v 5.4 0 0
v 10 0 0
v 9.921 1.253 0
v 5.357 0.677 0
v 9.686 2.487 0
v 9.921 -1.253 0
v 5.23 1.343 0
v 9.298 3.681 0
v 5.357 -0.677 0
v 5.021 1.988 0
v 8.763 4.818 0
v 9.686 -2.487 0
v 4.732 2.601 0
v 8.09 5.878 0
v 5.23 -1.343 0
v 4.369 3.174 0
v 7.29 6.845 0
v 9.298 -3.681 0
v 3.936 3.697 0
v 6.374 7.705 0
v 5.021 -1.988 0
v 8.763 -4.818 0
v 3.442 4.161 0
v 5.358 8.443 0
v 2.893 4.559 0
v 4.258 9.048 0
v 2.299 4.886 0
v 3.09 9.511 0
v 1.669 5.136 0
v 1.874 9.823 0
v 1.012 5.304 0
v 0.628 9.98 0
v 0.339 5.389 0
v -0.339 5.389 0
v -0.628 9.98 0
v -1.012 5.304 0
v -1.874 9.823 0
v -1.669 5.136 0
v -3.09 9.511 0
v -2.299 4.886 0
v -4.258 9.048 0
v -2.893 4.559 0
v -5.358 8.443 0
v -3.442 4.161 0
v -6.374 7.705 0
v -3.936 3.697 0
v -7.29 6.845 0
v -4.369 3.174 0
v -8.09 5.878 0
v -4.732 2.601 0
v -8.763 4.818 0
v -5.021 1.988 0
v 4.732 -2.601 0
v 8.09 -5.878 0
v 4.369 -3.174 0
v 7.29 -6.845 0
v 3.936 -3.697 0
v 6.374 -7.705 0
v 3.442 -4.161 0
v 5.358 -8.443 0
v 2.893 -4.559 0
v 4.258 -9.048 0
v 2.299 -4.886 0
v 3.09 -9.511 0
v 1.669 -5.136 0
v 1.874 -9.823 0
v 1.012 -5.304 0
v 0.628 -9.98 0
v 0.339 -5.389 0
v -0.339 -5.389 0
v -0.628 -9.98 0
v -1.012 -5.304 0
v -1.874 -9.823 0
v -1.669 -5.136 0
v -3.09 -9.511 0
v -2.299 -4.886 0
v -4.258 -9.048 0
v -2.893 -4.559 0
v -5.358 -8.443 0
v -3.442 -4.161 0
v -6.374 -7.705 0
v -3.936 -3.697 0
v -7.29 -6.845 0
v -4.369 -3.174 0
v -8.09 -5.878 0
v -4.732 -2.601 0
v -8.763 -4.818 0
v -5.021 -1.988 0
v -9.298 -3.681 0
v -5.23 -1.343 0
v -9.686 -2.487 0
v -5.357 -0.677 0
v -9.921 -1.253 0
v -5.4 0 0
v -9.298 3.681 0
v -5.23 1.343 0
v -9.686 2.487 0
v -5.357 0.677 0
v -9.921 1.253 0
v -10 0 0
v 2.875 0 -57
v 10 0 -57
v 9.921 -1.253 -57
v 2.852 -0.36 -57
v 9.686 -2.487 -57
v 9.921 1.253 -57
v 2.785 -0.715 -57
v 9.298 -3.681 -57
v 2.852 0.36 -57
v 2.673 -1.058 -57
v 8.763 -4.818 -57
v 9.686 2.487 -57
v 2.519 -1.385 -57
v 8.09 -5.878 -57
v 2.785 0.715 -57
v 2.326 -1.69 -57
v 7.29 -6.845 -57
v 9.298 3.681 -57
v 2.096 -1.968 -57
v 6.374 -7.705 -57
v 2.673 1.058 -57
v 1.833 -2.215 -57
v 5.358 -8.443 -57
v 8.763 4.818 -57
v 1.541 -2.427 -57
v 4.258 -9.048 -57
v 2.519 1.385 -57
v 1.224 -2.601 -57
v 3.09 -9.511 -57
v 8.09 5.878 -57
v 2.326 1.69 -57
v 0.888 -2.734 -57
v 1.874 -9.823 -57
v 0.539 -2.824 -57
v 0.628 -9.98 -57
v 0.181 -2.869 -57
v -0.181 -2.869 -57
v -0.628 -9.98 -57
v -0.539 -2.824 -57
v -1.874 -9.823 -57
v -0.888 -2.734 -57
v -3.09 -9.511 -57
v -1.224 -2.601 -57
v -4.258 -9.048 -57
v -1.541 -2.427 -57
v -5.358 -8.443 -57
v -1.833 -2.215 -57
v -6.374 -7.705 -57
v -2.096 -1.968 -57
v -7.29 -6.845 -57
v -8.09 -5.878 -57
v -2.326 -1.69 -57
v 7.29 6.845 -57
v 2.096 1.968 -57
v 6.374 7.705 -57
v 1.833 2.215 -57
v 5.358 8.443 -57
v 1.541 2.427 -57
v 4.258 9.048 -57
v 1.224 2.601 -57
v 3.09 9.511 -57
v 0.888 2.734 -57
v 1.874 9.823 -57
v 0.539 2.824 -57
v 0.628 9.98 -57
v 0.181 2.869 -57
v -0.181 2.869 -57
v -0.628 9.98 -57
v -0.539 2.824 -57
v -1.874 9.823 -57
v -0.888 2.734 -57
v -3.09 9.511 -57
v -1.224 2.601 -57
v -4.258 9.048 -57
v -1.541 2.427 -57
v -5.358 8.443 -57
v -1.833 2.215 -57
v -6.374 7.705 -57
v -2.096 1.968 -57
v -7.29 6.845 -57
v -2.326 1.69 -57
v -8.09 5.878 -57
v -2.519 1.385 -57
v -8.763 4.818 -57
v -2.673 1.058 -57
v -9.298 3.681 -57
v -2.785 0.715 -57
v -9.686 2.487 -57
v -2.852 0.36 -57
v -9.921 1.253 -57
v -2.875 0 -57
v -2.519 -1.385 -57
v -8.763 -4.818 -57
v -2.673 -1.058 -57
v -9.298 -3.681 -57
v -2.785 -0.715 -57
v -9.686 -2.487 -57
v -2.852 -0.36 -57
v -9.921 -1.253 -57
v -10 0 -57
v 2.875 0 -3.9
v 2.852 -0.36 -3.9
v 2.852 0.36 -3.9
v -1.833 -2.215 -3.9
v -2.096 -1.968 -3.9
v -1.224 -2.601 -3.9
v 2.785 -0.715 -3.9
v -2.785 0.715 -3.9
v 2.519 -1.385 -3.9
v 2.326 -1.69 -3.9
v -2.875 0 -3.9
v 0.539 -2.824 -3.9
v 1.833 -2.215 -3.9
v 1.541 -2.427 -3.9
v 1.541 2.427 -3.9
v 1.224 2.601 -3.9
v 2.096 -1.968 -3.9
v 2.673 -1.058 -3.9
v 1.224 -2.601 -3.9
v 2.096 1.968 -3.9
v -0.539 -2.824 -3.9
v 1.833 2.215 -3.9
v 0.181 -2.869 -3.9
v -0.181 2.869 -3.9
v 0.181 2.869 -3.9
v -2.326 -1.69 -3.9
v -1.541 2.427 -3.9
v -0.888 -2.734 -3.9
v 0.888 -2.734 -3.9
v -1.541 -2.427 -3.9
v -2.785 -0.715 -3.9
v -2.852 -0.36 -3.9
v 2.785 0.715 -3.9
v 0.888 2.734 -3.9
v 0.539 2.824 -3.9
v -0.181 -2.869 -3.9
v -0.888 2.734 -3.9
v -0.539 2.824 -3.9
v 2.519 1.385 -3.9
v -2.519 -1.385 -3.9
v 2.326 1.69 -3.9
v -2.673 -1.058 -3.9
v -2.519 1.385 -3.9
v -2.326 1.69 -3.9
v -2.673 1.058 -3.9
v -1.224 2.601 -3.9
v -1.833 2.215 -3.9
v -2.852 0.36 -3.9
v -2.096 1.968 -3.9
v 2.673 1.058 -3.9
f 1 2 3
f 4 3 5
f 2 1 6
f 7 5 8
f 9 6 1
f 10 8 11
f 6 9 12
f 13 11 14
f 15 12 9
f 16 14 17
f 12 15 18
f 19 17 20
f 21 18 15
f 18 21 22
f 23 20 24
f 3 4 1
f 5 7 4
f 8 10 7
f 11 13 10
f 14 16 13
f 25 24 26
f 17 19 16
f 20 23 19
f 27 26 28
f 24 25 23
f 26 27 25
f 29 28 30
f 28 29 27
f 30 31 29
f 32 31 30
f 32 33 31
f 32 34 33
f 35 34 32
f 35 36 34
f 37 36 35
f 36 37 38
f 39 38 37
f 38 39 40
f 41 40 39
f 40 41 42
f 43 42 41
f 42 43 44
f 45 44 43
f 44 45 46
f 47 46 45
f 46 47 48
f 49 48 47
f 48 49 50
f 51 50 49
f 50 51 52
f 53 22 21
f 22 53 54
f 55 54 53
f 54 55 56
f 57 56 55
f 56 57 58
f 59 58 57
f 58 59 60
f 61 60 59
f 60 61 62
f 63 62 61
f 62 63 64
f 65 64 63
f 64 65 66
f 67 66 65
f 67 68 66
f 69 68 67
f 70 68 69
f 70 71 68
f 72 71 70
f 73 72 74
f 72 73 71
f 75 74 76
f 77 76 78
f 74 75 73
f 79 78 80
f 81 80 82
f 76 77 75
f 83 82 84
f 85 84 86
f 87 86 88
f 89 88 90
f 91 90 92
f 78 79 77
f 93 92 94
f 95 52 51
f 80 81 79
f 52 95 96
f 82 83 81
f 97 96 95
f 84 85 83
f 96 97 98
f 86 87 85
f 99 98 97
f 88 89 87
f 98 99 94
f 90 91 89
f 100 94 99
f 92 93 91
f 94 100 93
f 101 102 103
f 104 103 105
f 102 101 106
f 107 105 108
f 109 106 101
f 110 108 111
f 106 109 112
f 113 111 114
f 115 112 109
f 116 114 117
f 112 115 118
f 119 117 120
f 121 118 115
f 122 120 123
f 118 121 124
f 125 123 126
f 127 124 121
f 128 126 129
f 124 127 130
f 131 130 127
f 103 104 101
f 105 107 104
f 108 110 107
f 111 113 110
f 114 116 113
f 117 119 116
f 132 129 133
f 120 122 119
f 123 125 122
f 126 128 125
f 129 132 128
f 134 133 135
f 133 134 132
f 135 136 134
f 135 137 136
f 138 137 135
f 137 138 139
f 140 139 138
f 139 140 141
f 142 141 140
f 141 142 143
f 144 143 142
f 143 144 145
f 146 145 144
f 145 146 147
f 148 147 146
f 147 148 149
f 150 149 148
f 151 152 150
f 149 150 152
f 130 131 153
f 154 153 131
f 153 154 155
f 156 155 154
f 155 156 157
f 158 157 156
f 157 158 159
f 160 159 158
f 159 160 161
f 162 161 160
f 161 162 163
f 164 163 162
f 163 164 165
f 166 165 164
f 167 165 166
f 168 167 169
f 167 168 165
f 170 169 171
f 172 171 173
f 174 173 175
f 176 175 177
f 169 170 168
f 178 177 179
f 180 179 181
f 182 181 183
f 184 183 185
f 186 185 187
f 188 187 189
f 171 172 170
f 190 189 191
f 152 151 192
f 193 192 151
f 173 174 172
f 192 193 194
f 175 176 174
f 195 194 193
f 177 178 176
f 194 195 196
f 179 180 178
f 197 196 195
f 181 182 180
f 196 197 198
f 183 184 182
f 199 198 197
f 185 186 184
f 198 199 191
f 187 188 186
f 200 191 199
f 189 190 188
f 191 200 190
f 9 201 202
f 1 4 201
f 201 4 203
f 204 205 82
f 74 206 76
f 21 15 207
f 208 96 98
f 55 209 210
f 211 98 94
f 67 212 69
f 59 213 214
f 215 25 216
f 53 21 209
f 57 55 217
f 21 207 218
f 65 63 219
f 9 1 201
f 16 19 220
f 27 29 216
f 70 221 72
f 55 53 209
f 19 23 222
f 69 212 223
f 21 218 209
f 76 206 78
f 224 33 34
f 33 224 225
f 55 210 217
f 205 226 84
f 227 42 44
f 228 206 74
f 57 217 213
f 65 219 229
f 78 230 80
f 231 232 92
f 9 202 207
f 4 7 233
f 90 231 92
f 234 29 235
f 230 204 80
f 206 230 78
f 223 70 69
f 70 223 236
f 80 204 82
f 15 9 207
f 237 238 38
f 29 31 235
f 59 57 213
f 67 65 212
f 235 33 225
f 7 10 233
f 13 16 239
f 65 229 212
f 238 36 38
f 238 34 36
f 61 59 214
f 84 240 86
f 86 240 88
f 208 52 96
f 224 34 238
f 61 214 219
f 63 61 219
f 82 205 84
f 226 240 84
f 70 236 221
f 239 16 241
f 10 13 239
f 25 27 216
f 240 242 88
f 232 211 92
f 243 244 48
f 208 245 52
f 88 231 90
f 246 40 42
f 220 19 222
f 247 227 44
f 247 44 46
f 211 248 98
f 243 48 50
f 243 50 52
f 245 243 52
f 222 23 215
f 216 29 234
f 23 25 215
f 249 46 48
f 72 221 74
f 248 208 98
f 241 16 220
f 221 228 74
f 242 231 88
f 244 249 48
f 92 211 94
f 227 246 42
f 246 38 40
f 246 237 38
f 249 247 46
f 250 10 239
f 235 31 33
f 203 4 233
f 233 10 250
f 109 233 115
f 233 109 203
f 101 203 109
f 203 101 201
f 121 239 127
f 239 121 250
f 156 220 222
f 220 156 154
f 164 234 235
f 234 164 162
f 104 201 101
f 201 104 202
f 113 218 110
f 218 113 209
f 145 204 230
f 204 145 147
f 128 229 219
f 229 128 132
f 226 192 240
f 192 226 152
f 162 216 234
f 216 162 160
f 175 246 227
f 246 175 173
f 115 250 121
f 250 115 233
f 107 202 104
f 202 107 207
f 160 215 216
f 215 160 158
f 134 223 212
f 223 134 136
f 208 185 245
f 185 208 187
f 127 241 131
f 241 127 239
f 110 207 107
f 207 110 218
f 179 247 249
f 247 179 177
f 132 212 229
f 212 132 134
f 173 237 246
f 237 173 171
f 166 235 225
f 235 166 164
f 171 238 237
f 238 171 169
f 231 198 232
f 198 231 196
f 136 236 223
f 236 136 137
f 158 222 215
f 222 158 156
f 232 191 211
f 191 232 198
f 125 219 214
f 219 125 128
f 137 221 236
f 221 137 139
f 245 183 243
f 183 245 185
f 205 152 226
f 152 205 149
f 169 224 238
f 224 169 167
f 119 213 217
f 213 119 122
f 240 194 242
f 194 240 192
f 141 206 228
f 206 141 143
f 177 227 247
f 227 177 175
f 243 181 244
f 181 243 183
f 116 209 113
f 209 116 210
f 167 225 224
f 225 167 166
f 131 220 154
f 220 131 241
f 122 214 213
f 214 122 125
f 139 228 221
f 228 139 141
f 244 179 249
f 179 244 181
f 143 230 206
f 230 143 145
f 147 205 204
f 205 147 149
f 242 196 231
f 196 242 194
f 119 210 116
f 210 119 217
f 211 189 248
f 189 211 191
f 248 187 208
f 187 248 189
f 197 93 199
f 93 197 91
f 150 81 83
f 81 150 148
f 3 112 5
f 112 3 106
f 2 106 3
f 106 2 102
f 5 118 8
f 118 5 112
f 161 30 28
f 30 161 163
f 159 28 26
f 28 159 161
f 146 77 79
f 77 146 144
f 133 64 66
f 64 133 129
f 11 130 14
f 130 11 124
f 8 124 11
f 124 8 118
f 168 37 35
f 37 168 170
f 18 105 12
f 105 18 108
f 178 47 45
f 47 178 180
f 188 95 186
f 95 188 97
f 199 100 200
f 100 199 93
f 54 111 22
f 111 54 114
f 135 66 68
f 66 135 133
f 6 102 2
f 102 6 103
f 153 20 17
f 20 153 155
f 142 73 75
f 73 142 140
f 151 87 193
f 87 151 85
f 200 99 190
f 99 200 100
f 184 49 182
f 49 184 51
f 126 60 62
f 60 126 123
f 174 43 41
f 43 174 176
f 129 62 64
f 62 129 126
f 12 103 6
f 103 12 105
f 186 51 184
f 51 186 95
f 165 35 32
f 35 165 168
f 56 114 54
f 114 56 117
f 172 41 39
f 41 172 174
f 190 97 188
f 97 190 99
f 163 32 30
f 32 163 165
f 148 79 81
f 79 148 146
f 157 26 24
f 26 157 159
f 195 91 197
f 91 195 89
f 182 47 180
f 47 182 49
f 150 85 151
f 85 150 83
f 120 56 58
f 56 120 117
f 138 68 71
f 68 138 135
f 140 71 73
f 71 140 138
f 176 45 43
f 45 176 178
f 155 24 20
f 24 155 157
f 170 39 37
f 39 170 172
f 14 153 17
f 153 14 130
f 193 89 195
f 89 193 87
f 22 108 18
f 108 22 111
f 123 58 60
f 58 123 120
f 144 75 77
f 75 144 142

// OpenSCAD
$fn = 50;


difference() {
	union() {
		translate(v = [0, 0, -57.0000000000]) {
			cylinder(h = 57, r = 10.0000000000);
		}
		cylinder(h = 0, r = 20.0000000000);
	}
	union() {
		translate(v = [0, 0, 0]) {
			rotate(a = [0, 0, 0]) {
				difference() {
					union() {
						#translate(v = [0, 0, -57.0000000000]) {
							cylinder(h = 57, r = 2.6000000000);
						}
						#translate(v = [0, 0, -3.9000000000]) {
							cylinder(h = 3.9000000000, r = 10.0000000000, r1 = 2.8750000000, r2 = 5.4000000000);
						}
						#translate(v = [0, 0, -57.0000000000]) {
							cylinder(h = 57, r = 2.8750000000);
						}
						#translate(v = [0, 0, -57.0000000000]) {
							cylinder(h = 57, r = 2.6000000000);
						}
					}
					union();
				}
			}
		}
	}
}
